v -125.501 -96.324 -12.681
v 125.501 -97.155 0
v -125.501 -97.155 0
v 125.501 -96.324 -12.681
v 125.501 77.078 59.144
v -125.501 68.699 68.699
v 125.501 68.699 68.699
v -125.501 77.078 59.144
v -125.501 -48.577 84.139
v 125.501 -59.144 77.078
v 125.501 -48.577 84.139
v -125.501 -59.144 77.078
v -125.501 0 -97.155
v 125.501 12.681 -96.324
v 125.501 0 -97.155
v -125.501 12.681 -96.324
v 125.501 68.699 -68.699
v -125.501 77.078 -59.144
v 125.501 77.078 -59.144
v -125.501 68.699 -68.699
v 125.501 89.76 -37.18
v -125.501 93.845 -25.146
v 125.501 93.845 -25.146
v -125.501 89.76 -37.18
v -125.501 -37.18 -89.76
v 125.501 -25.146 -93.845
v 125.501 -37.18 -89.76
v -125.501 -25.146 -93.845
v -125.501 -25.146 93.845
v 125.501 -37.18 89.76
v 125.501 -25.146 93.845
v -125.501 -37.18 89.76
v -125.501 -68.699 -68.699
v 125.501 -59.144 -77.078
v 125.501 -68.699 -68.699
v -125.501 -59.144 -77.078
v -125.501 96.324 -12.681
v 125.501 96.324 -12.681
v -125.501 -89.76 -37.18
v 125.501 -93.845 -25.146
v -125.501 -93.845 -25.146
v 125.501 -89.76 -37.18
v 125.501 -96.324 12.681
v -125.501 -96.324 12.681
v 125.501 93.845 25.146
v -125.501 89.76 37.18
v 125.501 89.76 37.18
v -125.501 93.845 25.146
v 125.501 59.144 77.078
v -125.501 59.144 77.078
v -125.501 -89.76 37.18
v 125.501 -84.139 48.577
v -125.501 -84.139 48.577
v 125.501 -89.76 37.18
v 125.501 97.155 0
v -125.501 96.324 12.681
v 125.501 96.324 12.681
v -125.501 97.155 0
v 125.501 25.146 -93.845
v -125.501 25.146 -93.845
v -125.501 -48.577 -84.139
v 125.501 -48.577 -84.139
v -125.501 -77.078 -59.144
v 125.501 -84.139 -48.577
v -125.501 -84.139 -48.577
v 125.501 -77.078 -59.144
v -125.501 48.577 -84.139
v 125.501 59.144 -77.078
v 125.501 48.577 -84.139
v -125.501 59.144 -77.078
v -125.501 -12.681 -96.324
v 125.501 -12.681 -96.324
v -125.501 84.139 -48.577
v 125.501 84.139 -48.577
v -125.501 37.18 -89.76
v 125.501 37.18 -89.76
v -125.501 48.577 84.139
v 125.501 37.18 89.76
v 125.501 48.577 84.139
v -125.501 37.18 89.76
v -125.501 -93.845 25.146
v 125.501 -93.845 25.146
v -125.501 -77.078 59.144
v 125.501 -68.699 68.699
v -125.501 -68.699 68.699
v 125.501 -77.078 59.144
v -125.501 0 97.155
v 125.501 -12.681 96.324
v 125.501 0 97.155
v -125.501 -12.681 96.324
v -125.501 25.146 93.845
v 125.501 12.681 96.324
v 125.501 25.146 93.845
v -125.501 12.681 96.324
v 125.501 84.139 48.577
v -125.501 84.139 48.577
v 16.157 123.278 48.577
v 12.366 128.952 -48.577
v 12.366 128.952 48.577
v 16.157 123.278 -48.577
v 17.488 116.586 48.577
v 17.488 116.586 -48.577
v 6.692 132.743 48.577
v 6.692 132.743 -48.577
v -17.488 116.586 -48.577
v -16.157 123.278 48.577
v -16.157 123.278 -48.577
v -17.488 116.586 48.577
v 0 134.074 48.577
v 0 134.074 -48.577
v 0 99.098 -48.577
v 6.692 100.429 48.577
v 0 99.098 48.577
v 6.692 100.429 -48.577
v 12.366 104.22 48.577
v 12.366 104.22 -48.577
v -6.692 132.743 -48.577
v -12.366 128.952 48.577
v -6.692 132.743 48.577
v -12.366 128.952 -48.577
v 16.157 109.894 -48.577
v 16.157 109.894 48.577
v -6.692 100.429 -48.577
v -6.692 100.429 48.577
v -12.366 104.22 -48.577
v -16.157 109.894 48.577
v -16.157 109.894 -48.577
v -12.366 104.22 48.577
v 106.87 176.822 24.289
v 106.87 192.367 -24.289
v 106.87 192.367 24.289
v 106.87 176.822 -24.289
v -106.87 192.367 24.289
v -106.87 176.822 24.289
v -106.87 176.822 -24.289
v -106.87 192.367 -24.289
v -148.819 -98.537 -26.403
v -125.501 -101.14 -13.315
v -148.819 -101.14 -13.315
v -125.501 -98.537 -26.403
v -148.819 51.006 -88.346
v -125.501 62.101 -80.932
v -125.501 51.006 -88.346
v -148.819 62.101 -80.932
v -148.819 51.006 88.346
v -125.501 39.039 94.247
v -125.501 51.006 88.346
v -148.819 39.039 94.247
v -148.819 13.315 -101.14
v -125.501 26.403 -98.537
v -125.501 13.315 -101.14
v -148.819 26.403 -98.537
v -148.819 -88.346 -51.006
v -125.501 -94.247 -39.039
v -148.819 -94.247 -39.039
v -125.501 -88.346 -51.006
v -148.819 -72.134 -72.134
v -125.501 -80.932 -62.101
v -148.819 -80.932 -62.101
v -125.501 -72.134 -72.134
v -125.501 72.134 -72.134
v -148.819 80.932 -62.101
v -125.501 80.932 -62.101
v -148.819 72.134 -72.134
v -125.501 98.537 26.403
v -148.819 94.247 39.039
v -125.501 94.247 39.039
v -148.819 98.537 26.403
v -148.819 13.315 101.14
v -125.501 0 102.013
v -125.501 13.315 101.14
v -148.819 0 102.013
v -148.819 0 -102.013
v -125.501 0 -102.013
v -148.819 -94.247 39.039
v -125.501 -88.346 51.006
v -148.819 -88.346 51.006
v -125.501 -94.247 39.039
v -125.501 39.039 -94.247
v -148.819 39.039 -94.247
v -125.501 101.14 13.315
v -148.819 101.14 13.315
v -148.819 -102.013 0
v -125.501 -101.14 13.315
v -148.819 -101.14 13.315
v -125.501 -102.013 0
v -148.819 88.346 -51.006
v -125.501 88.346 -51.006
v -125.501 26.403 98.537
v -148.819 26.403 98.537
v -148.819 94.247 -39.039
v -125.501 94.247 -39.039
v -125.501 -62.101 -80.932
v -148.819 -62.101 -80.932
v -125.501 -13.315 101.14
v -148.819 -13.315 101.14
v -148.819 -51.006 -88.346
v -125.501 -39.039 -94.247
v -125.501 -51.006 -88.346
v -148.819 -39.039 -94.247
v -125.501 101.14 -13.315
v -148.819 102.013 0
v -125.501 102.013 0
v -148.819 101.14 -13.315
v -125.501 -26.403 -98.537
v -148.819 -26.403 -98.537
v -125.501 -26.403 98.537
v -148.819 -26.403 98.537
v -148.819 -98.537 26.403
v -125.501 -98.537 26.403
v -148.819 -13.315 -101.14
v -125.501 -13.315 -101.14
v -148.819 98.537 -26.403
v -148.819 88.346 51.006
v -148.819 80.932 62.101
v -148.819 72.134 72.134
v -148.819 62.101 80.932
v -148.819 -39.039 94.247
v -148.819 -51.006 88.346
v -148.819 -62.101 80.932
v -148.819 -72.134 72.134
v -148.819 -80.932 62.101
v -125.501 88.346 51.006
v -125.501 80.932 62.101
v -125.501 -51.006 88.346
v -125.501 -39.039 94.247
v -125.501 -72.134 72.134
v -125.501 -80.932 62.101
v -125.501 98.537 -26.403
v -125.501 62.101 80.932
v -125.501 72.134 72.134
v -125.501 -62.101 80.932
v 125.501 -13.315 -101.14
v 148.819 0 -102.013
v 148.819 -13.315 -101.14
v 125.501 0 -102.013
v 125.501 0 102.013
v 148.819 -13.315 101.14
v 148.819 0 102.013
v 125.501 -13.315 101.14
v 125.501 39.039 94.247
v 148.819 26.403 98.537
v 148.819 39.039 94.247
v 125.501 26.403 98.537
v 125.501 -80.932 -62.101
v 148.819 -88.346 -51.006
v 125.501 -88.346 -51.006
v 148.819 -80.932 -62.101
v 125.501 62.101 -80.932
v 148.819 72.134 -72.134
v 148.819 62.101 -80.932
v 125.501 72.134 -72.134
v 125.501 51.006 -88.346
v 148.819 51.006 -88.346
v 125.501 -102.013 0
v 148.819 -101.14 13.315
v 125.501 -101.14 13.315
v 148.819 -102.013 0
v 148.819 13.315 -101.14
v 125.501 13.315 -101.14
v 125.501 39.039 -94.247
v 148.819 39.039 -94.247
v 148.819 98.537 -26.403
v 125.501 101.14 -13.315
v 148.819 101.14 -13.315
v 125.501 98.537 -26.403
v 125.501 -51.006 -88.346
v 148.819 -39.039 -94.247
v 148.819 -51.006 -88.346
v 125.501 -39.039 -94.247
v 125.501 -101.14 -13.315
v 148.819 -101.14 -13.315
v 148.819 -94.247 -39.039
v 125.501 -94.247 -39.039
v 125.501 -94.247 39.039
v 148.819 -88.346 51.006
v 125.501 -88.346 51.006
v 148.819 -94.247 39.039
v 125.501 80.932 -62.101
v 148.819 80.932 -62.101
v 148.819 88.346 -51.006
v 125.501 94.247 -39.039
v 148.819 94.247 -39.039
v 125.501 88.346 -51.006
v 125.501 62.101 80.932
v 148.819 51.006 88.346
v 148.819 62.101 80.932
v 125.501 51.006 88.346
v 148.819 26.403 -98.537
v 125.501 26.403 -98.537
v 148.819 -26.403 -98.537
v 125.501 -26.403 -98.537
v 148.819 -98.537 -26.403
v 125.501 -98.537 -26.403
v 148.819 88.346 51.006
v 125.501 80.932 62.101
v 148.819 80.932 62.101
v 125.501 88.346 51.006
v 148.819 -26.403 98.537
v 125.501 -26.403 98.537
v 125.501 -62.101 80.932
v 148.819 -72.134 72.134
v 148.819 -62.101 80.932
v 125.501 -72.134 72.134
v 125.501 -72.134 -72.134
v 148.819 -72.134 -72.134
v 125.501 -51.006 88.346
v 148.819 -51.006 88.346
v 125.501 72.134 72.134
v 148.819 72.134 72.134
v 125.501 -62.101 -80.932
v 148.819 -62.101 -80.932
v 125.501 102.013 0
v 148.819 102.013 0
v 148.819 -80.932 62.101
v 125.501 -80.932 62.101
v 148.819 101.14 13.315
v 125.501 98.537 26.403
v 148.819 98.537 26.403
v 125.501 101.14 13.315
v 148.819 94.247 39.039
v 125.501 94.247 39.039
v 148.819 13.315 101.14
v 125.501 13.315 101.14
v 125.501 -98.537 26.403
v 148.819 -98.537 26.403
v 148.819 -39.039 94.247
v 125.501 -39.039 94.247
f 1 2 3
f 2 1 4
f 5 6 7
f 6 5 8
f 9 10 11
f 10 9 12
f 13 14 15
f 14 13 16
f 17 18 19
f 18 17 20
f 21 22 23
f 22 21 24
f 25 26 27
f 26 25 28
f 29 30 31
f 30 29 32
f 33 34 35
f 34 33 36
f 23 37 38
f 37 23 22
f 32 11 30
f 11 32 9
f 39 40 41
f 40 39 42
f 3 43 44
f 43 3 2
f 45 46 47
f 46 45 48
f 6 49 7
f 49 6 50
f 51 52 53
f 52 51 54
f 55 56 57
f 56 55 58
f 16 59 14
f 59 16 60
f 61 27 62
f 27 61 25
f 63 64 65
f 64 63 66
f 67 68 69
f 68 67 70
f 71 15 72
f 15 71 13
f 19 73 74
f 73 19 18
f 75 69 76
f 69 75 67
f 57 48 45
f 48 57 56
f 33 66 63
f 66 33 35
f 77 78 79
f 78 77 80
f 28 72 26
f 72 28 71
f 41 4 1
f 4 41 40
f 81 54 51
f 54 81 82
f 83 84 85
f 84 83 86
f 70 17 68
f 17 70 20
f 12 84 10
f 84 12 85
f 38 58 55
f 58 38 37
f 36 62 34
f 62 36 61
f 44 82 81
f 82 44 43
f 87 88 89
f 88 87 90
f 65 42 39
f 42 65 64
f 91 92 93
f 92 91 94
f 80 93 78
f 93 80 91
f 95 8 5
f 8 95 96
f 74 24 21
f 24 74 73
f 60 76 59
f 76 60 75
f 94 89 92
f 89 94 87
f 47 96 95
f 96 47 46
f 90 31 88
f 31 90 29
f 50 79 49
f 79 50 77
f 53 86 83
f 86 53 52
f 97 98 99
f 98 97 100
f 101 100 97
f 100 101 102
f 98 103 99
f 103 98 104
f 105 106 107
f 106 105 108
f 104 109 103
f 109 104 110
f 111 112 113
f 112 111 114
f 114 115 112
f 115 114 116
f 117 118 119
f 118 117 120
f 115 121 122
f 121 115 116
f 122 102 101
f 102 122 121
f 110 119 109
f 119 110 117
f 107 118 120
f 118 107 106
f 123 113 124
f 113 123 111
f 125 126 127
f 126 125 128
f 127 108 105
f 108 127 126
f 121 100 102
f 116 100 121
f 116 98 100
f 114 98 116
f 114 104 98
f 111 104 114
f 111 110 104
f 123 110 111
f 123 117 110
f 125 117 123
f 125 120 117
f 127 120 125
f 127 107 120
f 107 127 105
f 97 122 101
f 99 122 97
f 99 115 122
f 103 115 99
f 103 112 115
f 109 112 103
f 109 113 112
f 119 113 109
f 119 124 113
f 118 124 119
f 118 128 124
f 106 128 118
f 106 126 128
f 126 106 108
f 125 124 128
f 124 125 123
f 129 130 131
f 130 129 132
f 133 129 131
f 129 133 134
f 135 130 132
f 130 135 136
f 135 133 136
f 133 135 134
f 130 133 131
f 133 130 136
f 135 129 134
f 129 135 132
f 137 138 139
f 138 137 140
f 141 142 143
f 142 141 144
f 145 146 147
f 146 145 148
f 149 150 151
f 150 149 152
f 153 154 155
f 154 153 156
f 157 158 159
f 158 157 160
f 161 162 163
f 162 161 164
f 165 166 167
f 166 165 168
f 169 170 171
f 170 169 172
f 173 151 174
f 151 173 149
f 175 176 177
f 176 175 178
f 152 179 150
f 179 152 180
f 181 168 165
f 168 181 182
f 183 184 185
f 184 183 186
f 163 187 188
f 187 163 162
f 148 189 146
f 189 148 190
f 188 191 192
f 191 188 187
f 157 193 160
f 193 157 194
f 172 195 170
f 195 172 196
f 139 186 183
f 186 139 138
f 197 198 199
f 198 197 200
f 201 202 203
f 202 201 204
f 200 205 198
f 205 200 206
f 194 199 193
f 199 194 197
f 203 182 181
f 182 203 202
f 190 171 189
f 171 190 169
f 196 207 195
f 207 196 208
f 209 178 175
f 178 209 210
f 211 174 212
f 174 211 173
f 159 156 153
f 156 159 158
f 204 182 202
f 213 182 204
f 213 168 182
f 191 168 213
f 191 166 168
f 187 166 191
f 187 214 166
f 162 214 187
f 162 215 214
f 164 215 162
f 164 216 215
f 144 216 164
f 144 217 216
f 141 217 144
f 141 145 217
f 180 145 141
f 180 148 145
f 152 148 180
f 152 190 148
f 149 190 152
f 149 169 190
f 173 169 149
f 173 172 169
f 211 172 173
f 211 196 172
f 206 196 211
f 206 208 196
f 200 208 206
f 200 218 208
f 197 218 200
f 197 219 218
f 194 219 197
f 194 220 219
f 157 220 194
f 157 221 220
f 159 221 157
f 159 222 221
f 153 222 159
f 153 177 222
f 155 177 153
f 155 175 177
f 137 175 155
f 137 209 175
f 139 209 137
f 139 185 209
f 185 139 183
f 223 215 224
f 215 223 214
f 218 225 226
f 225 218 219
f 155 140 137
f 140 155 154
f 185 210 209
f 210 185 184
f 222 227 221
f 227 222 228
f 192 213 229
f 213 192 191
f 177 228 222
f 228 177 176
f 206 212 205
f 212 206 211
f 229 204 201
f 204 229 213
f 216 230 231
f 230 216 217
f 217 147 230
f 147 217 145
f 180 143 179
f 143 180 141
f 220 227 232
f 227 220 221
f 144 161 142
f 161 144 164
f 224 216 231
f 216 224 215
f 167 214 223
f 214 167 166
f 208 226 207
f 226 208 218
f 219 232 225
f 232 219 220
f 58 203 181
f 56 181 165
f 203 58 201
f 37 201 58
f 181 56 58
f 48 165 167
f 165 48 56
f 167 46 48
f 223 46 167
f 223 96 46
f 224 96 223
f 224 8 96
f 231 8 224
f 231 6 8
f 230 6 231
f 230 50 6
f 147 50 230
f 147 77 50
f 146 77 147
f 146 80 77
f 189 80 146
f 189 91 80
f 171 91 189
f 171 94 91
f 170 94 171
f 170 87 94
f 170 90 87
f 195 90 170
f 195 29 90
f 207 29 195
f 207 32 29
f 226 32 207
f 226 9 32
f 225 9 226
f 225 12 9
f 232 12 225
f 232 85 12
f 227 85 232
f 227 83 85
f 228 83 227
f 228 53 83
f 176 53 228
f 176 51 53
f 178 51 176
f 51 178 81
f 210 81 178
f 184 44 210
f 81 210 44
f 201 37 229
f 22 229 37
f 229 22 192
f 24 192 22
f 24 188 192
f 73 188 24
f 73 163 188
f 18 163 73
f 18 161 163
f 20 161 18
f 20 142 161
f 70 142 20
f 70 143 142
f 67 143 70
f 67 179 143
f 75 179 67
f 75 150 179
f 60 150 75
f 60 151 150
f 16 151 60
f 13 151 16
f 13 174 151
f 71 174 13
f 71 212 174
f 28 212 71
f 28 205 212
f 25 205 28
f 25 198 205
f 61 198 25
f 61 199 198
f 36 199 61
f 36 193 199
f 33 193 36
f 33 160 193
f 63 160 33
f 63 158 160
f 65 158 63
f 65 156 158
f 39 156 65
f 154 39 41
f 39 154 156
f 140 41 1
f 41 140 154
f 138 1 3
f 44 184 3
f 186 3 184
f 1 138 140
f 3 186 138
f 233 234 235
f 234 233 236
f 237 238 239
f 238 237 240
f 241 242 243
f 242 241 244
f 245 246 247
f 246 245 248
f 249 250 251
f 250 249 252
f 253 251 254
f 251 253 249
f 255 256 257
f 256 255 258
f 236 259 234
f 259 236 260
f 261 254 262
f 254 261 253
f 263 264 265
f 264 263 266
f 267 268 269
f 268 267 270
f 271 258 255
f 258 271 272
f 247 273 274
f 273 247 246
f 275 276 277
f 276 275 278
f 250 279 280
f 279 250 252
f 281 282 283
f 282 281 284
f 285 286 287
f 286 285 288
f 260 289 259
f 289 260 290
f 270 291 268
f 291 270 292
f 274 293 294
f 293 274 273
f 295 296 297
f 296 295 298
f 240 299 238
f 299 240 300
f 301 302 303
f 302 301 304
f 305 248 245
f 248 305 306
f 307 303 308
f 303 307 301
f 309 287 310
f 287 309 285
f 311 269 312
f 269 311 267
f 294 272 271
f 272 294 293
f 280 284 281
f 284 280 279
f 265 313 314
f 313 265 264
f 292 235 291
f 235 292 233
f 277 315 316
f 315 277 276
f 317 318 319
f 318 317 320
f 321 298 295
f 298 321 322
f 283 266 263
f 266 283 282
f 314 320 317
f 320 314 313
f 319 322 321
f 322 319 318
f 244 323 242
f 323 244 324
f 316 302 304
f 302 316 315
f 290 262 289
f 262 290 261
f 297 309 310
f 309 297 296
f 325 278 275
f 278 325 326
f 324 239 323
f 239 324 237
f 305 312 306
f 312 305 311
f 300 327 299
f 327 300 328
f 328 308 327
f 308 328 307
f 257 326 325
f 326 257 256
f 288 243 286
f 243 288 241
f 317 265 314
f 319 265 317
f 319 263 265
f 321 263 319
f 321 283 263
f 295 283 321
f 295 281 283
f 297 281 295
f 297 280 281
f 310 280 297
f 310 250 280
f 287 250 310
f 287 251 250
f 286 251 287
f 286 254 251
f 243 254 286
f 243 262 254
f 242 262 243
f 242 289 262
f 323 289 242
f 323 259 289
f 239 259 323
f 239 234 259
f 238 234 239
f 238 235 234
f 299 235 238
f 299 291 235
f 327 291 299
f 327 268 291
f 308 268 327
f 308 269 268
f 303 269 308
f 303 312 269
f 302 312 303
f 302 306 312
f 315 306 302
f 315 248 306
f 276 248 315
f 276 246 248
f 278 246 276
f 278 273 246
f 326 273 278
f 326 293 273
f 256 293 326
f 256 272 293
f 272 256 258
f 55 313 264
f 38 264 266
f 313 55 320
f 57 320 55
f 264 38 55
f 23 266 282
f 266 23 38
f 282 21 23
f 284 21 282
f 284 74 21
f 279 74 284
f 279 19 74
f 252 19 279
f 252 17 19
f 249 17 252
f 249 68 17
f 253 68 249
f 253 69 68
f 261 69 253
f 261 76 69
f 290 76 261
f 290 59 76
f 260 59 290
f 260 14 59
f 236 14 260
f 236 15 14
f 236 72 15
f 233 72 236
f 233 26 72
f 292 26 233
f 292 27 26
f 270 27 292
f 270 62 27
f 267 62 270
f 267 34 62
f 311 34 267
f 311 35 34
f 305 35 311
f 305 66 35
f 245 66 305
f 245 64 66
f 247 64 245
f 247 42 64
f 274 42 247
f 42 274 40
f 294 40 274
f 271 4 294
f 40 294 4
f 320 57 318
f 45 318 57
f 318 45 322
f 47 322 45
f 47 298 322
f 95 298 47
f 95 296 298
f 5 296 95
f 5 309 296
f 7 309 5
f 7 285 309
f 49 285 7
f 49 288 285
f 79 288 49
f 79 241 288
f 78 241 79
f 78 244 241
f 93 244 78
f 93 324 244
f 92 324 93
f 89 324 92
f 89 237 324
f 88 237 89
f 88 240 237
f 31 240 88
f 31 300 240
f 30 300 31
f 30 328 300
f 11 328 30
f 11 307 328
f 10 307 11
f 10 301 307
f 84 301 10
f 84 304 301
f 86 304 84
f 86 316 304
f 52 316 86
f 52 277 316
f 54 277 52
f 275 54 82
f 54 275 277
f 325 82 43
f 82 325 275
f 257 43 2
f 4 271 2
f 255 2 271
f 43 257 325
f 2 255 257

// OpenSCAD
// Auto-generated by scripts/author_from_manifest.py (Phase D.3).
// Source: data/phase_d_manifest.json (sku_intent='nibco-lc-2000-butterfly-4in').
// Do not hand-edit — regenerate from the manifest.
//
// @part nibco_lc_2000_butterfly_4in
// @kind valve
// @category valve.butterfly
// @display-name "Nibco LC-2000 Grooved Butterfly Valve 4\" w/ Tamper Switch"
// @mfg nibco
// @mfg-pn LC-2000
// @listing UL FM
// @price-usd 280.00
// @install-minutes 30
// @crew foreman
// @param size_in number default=4 label="Size" unit="in"
// @port inlet position=[-0.05,0,0] direction=[-1,0,0] style=grooved size_in=4 role=run_a
// @port outlet position=[0.05,0,0] direction=[1,0,0] style=grooved size_in=4 role=run_b

size_in = 4.0;

function od_mm(nps) =
    nps ==   1  ? 33.4 :
    nps == 1.25 ? 42.2 :
    nps == 1.5  ? 48.3 :
    nps ==   2  ? 60.3 :
    nps == 2.5  ? 73.0 :
    nps ==   3  ? 88.9 :
    nps ==   4  ? 114.3 :
    nps ==   6  ? 168.3 :
    nps ==   8  ? 219.1 : 73.0;

od = od_mm(size_in);
body_len = od * 2.4;
body_d   = od * 1.7;

union() {
    // Valve body
    rotate([0, 90, 0])
        cylinder(h = body_len, d = body_d, center = true, $fn = 48);
    // Stem / handle indicator
    translate([0, body_d * 0.6, 0])
        cylinder(h = body_d * 0.5, d = body_d * 0.18, center = true, $fn = 16);
    translate([0, body_d * 0.95, 0])
        cube([body_d * 1.1, body_d * 0.08, body_d * 0.25], center = true);
    // End flanges
    translate([-body_len/2, 0, 0])
        rotate([0, 90, 0])
        cylinder(h = body_d * 0.12, d = body_d * 1.05, center = true, $fn = 48);
    translate([ body_len/2, 0, 0])
        rotate([0, 90, 0])
        cylinder(h = body_d * 0.12, d = body_d * 1.05, center = true, $fn = 48);
}
